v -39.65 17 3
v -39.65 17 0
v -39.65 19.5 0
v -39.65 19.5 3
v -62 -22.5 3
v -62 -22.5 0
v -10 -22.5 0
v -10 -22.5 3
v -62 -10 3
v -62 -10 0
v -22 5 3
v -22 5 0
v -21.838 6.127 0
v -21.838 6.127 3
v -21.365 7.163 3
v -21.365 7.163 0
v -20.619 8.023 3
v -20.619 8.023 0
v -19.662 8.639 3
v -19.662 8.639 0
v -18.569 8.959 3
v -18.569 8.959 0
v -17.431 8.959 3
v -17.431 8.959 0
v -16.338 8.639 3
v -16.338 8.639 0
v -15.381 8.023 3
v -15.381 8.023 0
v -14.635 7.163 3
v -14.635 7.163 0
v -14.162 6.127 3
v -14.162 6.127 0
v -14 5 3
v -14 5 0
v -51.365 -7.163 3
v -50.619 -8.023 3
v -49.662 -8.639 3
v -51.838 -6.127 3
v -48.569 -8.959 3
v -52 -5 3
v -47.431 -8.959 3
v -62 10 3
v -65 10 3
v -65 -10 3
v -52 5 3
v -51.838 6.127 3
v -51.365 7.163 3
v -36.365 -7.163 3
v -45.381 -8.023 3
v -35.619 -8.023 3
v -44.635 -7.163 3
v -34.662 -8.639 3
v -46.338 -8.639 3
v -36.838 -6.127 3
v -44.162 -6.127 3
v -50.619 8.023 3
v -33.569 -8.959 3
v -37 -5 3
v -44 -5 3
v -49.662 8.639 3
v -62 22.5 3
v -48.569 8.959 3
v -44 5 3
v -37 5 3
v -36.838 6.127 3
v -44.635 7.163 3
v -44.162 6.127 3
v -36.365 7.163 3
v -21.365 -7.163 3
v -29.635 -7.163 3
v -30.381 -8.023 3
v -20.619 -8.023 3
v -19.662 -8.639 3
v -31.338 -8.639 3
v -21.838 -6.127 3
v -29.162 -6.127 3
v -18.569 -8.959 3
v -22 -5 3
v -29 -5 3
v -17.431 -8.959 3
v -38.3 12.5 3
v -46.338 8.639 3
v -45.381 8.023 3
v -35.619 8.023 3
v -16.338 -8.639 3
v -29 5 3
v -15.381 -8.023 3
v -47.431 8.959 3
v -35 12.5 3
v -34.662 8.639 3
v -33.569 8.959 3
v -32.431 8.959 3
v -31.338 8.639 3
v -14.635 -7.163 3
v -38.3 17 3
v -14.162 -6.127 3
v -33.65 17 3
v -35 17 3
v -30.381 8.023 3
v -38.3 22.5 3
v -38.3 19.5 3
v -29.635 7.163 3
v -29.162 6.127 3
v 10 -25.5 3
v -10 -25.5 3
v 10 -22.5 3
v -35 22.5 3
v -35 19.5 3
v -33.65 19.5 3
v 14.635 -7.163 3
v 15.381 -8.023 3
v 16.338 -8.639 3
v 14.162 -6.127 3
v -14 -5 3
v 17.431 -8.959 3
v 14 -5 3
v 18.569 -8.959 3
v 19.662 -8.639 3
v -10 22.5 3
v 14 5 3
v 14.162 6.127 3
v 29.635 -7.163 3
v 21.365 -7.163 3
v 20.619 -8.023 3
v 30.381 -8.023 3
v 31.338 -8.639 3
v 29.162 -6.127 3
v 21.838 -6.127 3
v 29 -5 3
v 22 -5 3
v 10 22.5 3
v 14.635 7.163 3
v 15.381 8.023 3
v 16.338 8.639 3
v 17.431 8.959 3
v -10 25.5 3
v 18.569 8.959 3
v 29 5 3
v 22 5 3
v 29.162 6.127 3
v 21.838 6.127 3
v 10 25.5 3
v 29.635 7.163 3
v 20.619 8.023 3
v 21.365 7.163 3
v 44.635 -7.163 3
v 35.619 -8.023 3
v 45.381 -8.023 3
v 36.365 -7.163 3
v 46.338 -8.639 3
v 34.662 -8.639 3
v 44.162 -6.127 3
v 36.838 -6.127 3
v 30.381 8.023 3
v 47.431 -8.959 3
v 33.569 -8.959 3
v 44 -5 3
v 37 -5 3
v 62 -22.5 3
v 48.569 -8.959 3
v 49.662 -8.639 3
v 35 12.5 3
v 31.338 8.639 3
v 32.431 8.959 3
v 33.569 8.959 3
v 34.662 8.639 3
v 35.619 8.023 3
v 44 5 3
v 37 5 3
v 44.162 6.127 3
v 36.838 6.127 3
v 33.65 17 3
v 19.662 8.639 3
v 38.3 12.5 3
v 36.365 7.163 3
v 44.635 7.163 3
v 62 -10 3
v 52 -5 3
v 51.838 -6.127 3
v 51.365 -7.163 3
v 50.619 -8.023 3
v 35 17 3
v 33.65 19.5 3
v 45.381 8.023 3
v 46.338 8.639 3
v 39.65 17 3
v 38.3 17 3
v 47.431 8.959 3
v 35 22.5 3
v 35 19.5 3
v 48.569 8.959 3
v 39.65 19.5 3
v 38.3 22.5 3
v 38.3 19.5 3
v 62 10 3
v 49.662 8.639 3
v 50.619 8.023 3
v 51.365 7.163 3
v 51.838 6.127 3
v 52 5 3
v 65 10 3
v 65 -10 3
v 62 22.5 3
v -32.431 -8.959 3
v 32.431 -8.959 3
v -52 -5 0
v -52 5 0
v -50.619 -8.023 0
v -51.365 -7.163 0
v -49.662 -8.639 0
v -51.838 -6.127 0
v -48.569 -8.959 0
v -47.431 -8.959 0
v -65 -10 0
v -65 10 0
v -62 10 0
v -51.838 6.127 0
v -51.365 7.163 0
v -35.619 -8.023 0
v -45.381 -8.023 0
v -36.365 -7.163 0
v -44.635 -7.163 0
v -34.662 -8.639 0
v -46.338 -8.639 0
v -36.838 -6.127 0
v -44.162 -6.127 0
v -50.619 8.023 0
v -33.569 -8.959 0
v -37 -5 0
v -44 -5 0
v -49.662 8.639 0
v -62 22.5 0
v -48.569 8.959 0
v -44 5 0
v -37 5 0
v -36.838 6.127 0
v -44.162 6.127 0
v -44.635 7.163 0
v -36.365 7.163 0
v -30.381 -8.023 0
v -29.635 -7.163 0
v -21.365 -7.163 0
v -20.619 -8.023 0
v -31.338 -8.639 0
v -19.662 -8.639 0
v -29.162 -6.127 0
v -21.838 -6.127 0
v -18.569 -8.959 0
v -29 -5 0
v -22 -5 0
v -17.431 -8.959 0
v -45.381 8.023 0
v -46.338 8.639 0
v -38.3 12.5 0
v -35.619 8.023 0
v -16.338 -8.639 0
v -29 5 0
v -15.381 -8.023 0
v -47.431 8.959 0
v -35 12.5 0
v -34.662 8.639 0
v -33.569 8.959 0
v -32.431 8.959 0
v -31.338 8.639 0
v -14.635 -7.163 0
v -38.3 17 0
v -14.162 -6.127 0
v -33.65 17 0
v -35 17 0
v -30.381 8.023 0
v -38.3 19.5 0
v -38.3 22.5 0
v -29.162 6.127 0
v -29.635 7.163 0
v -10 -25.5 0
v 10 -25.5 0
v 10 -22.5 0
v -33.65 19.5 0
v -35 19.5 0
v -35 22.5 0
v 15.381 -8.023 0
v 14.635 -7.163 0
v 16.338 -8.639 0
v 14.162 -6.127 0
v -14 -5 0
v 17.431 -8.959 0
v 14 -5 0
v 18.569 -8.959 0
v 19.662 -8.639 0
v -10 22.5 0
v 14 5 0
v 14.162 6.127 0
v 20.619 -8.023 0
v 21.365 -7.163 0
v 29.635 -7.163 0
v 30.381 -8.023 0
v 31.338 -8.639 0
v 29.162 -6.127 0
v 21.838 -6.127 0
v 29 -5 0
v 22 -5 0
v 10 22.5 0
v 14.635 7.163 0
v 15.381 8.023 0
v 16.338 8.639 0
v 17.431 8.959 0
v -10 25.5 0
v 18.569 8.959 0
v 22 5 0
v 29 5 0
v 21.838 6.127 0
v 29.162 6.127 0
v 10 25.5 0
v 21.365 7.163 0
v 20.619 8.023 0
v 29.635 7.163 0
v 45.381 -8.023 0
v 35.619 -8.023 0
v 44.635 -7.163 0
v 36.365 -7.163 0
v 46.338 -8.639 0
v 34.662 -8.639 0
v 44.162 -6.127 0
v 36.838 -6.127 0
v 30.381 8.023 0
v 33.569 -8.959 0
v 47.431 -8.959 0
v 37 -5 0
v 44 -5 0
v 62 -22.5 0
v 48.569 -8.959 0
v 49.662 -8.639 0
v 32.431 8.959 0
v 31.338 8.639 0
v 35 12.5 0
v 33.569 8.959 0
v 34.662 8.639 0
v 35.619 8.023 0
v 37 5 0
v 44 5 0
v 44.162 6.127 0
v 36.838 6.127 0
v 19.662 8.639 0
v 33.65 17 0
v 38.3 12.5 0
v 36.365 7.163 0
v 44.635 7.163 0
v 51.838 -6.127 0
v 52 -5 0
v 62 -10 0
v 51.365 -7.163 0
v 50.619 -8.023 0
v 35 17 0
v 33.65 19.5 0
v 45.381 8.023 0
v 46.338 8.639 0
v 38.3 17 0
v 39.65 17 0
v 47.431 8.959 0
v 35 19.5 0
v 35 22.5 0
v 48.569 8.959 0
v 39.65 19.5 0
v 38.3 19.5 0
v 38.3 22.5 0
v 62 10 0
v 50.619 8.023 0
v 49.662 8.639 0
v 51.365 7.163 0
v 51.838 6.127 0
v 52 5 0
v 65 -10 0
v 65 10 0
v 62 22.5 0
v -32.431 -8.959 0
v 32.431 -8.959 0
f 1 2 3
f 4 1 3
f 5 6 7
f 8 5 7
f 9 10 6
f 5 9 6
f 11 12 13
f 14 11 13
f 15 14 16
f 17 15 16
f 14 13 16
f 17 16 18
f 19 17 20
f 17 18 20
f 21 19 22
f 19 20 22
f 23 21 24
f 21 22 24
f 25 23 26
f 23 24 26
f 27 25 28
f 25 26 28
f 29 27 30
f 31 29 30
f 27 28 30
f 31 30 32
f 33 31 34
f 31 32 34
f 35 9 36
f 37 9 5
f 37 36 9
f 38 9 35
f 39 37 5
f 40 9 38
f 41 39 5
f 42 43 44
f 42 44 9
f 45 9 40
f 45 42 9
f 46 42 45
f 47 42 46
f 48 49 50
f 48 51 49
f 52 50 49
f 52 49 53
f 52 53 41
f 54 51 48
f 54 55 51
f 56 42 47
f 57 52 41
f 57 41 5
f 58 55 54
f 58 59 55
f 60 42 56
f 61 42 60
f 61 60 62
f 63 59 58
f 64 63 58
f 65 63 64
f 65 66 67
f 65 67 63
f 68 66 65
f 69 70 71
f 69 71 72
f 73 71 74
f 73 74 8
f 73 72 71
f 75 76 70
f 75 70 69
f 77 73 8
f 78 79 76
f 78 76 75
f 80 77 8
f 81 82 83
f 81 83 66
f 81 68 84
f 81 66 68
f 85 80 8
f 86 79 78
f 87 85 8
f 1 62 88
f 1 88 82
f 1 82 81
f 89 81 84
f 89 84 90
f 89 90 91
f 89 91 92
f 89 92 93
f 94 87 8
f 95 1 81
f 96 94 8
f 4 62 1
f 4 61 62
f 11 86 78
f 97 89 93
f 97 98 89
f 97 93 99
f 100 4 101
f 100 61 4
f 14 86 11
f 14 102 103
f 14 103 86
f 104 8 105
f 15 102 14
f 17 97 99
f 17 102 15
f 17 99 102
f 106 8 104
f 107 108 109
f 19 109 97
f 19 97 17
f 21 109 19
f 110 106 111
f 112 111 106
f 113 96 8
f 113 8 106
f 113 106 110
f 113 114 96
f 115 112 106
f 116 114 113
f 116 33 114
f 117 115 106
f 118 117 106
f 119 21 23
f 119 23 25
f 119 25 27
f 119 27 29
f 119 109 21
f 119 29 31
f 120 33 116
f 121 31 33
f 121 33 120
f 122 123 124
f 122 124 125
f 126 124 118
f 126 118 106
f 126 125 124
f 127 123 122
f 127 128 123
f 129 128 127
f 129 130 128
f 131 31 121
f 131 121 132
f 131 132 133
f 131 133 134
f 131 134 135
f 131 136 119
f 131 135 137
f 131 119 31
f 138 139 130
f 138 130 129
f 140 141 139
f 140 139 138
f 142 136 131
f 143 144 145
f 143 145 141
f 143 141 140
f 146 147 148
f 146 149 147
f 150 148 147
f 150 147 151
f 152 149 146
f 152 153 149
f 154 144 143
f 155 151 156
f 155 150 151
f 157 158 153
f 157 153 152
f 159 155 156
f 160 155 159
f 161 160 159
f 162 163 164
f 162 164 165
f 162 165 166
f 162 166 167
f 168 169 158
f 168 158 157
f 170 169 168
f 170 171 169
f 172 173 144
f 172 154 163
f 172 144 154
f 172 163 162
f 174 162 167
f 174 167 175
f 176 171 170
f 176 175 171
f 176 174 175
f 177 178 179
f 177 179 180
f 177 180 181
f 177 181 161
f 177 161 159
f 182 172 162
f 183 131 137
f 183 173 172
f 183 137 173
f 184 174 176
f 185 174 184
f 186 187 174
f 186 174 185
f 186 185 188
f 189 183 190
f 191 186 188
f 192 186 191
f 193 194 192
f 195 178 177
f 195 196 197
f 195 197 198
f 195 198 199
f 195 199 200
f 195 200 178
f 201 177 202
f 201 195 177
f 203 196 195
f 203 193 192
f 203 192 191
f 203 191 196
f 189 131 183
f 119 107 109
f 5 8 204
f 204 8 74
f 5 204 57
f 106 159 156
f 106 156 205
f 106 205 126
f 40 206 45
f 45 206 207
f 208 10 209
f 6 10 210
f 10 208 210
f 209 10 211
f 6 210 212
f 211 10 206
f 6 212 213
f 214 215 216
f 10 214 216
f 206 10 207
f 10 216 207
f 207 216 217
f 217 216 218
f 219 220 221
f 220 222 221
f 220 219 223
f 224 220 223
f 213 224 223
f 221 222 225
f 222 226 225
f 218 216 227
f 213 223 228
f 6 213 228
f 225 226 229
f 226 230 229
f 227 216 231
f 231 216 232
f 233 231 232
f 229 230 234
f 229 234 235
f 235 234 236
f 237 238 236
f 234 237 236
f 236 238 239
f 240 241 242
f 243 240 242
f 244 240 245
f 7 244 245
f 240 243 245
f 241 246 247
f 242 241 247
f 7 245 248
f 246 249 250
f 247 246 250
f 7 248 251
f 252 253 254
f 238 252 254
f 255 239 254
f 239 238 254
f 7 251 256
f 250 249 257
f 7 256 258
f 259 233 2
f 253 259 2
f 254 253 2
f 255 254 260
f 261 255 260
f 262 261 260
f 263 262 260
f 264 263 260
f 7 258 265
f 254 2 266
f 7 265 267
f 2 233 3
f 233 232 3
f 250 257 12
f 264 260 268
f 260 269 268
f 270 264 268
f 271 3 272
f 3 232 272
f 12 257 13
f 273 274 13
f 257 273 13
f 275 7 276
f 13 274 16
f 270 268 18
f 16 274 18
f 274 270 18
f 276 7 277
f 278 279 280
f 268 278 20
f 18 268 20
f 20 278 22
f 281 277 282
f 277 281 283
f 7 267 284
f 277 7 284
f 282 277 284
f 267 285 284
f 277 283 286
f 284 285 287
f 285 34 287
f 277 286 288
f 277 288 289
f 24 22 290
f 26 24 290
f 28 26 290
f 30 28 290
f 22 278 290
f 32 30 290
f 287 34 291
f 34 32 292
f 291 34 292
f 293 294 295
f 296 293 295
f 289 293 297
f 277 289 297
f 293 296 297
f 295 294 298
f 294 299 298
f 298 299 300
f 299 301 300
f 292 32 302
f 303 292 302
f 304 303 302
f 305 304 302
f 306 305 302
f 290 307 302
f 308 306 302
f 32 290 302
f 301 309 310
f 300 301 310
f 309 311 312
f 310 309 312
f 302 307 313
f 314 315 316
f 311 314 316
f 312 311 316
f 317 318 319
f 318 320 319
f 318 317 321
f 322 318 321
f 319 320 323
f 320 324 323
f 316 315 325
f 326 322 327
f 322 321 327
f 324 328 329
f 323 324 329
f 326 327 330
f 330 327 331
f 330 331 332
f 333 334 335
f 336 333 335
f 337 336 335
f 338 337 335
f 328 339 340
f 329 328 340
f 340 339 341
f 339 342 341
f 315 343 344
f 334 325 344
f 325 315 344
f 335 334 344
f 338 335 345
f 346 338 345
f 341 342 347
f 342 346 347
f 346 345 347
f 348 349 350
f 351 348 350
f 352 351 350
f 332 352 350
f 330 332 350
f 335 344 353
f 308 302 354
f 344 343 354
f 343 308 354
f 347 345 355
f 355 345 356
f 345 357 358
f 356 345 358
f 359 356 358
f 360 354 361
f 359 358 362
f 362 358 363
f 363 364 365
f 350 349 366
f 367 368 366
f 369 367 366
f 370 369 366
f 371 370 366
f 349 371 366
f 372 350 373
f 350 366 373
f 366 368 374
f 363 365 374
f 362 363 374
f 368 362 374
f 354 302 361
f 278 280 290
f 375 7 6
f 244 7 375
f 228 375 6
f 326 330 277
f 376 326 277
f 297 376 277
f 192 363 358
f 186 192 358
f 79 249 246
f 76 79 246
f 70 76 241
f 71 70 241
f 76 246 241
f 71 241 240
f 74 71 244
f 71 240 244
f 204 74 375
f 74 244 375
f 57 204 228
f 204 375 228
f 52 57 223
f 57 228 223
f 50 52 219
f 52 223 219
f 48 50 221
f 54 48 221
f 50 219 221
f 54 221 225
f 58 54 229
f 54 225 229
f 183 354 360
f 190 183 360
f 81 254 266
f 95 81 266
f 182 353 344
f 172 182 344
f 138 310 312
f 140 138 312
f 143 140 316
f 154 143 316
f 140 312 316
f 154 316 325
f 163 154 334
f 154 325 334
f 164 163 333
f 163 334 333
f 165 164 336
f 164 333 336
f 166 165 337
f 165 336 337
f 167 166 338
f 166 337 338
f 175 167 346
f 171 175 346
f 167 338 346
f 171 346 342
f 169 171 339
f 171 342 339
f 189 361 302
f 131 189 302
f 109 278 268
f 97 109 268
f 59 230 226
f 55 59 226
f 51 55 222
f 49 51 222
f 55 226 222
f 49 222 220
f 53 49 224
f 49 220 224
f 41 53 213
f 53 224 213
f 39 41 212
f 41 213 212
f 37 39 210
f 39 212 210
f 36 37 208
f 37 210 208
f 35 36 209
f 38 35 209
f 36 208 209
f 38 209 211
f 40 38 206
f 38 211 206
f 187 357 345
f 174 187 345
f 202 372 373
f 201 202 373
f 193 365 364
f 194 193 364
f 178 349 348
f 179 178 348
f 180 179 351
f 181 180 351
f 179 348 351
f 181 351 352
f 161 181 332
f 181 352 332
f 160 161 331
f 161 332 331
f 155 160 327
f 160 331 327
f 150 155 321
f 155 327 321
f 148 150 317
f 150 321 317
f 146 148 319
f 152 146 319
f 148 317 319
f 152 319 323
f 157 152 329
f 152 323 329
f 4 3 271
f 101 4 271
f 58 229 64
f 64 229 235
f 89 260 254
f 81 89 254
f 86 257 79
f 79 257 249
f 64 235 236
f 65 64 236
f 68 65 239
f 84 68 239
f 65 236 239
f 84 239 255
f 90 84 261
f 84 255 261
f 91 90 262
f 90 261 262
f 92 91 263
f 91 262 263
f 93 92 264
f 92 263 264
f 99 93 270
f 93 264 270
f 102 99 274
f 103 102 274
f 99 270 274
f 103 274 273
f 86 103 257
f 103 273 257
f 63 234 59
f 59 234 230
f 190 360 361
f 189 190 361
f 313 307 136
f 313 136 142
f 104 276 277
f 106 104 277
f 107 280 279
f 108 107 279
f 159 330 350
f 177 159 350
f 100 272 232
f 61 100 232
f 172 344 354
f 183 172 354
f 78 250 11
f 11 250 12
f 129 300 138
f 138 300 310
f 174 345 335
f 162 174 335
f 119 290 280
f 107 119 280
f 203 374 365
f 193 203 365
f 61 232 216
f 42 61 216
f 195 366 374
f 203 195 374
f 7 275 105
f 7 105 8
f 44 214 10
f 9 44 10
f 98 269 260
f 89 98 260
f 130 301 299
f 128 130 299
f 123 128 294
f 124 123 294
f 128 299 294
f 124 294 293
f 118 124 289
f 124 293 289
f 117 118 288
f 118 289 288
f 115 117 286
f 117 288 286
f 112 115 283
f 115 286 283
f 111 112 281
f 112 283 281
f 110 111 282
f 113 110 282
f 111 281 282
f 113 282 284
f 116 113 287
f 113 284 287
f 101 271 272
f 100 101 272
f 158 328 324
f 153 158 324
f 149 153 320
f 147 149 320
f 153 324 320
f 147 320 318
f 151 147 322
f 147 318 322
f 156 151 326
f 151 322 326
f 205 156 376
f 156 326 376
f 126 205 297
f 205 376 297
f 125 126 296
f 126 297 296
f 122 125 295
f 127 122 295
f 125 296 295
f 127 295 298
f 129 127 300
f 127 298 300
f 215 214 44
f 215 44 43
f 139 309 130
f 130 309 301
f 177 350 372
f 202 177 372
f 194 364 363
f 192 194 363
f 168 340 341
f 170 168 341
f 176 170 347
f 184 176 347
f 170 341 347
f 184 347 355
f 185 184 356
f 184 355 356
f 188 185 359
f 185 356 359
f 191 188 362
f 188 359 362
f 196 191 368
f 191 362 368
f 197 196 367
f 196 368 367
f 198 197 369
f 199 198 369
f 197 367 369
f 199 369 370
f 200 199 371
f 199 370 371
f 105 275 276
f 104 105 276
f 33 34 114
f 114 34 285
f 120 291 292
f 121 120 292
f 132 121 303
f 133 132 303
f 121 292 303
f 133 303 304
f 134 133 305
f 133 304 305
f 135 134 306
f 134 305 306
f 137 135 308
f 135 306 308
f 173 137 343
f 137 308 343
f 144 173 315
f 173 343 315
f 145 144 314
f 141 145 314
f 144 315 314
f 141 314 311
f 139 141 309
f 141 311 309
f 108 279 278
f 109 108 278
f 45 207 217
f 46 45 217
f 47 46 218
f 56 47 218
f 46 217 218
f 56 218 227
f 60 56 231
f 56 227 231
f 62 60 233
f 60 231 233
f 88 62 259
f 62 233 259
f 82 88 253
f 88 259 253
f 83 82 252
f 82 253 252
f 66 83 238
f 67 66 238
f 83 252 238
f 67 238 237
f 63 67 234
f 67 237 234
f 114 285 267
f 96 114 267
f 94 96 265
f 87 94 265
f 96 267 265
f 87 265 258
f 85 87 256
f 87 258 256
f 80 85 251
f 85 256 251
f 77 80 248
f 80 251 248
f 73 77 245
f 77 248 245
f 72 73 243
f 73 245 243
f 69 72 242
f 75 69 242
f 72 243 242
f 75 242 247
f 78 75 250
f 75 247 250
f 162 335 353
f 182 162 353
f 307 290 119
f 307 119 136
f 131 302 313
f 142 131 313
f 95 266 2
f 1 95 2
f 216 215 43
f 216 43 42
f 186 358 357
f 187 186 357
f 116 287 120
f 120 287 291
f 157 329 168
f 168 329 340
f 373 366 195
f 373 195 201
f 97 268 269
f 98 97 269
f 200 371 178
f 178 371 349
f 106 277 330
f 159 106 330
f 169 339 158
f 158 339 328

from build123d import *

# Parameters (mm, degrees)
SKETCH1_W           = 3
SKETCH1_H           = 20
SKETCH1_W_2         = 20
SKETCH1_H_2         = 3
BOSS_EXTRUDE1_DEPTH = 3


with BuildPart() as part:
    # Sketch1 → Boss-Extrude1 (new body)
    # profile 1 of 5: a face of its own
    with BuildSketch(Plane.XY):
        with Locations((-63.5, 0)):
            Rectangle(SKETCH1_W, SKETCH1_H)
    # profile 2 of 5: a face of its own
    with BuildSketch(Plane.XY):
        Polygon((10, -22.5), (62, -22.5), (62, -10), (62, 10), (62, 22.5), (38.3, 22.5), (38.3, 19.5), (39.65, 19.5), (39.65, 17), (38.3, 17), (38.3, 12.5), (35, 12.5), (35, 17), (33.65, 17), (33.65, 19.5), (35, 19.5), (35, 22.5), (10, 22.5), (-10, 22.5), (-35, 22.5), (-35, 19.5), (-33.65, 19.5), (-33.65, 17), (-35, 17), (-35, 12.5), (-38.3, 12.5), (-38.3, 17), (-39.65, 17), (-39.65, 19.5), (-38.3, 19.5), (-38.3, 22.5), (-62, 22.5), (-62, 10), (-62, -10), (-62, -22.5), (-10, -22.5), align=None)
        with BuildLine():
            ThreePointArc((-44, -5), (-48, -9), (-52, -5))
            Line((-52, -5), (-52, 5))
            ThreePointArc((-52, 5), (-48, 9), (-44, 5))
            Line((-44, 5), (-44, -5))
        make_face(mode=Mode.SUBTRACT)
        with BuildLine():
            ThreePointArc((-29, -5), (-33, -9), (-37, -5))
            Line((-37, -5), (-37, 5))
            ThreePointArc((-37, 5), (-33, 9), (-29, 5))
            Line((-29, 5), (-29, -5))
        make_face(mode=Mode.SUBTRACT)
        with BuildLine():
            ThreePointArc((-14, -5), (-18, -9), (-22, -5))
            Line((-22, -5), (-22, 5))
            ThreePointArc((-22, 5), (-18, 9), (-14, 5))
            Line((-14, 5), (-14, -5))
        make_face(mode=Mode.SUBTRACT)
        with BuildLine():
            Line((22, 5), (22, -5))
            ThreePointArc((22, -5), (18, -9), (14, -5))
            Line((14, -5), (14, 5))
            ThreePointArc((14, 5), (18, 9), (22, 5))
        make_face(mode=Mode.SUBTRACT)
        with BuildLine():
            Line((37, 5), (37, -5))
            ThreePointArc((37, -5), (33, -9), (29, -5))
            Line((29, -5), (29, 5))
            ThreePointArc((29, 5), (33, 9), (37, 5))
        make_face(mode=Mode.SUBTRACT)
        with BuildLine():
            Line((52, 5), (52, -5))
            ThreePointArc((52, -5), (48, -9), (44, -5))
            Line((44, -5), (44, 5))
            ThreePointArc((44, 5), (48, 9), (52, 5))
        make_face(mode=Mode.SUBTRACT)
    # profile 3 of 5: a face of its own
    with BuildSketch(Plane.XY):
        with Locations((0, 24)):
            Rectangle(SKETCH1_W_2, SKETCH1_H_2)
    # profile 4 of 5: a face of its own
    with BuildSketch(Plane.XY):
        with Locations((63.5, 0)):
            Rectangle(SKETCH1_W, SKETCH1_H)
    # profile 5 of 5: a face of its own
    with BuildSketch(Plane.XY):
        with Locations((0, -24)):
            Rectangle(SKETCH1_W_2, SKETCH1_H_2)
    extrude(amount=BOSS_EXTRUDE1_DEPTH)


solid = part.part
